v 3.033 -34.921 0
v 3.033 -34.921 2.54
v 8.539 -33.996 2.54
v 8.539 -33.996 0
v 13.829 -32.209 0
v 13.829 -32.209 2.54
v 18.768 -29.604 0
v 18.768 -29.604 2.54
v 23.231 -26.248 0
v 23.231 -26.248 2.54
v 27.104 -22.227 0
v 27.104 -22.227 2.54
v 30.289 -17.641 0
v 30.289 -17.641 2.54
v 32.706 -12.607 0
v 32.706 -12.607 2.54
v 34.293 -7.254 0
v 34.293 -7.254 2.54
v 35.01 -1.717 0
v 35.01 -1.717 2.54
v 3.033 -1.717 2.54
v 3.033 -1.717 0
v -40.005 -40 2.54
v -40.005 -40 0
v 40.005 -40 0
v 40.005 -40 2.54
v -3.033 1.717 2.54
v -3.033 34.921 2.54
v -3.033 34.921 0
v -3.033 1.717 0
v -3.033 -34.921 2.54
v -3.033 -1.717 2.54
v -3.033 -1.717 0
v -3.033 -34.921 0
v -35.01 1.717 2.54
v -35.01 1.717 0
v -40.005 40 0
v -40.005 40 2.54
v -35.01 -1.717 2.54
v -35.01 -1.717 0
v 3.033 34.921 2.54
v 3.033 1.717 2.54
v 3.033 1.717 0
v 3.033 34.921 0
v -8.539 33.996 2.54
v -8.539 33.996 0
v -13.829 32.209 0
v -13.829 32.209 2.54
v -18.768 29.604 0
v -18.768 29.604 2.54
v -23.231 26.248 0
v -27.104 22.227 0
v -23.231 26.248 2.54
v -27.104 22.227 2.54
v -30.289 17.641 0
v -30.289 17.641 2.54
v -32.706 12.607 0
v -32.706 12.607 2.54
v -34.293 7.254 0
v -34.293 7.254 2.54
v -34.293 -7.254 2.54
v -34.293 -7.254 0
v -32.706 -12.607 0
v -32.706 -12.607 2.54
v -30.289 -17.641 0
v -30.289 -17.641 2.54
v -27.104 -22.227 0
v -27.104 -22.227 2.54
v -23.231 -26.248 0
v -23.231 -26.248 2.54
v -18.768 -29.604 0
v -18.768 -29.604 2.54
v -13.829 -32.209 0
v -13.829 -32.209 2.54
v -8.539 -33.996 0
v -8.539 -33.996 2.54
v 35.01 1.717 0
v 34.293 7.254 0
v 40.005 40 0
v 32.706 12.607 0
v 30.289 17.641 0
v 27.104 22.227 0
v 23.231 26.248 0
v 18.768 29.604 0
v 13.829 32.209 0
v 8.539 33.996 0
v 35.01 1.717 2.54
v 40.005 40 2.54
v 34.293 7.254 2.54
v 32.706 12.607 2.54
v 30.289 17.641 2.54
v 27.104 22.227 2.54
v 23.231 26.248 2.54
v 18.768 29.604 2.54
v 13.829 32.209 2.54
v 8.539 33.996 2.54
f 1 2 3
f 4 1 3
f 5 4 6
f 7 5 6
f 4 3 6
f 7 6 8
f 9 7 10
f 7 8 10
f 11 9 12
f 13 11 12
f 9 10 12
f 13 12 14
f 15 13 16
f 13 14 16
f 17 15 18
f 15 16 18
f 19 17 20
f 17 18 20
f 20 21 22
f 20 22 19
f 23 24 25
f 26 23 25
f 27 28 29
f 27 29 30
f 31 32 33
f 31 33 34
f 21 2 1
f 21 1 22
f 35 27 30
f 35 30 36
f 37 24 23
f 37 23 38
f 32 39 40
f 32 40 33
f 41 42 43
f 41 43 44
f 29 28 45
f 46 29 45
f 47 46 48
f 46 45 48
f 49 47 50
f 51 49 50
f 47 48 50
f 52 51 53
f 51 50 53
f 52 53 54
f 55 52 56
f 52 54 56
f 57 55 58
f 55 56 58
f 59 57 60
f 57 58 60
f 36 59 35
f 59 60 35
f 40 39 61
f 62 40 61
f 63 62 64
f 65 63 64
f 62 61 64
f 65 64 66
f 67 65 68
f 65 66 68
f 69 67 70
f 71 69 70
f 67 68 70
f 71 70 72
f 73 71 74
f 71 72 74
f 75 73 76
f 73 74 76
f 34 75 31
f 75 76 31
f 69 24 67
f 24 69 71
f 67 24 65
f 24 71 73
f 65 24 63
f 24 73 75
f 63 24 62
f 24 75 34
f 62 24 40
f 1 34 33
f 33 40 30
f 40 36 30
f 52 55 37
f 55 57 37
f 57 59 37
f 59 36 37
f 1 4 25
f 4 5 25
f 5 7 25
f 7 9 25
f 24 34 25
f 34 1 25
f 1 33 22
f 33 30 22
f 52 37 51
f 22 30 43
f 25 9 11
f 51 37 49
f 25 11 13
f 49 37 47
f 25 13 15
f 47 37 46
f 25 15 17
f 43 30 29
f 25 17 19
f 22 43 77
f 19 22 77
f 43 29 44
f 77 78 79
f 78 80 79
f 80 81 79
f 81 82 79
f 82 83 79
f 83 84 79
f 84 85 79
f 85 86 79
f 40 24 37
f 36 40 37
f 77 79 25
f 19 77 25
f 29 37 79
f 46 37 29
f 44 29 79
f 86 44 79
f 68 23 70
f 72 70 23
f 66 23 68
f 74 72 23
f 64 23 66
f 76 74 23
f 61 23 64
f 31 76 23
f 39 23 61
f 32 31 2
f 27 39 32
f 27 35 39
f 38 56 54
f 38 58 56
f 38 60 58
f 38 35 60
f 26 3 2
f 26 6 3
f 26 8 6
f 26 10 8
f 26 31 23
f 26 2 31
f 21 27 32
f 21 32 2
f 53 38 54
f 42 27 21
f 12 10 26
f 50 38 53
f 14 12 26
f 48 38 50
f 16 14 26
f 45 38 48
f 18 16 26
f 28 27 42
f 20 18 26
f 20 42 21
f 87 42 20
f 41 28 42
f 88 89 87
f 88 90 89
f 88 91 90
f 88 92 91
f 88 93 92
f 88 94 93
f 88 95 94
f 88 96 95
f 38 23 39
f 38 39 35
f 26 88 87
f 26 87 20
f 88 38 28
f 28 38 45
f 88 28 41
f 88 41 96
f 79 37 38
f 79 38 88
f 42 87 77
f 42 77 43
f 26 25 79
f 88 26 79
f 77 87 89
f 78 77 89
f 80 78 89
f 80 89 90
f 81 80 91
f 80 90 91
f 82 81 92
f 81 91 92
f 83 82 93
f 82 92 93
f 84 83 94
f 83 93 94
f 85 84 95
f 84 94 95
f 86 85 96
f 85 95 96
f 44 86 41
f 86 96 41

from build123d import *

# Parameters (mm, degrees)
SKETCH1_W           = 80.01
SKETCH1_H           = 80.001
BOSS_EXTRUDE1_DEPTH = 5.08
SKETCH2_R           = 35.052
CUT_EXTRUDE1_DEPTH  = 5.08
SKETCH3_W           = 3.032686736
SKETCH3_H           = 3.433230268
BOSS_EXTRUDE3_DEPTH = 5.08
SKETCH5_W           = 135.597082566
SKETCH5_H           = 106.556051774
CUT_EXTRUDE2_DEPTH  = 2.54


with BuildPart() as part:
    # Sketch1 → Boss-Extrude1 (new body)
    with BuildSketch(Plane.XY):
        Rectangle(SKETCH1_W, SKETCH1_H)
    extrude(amount=BOSS_EXTRUDE1_DEPTH)

    # Sketch2 → Cut-Extrude1 (cut)
    with BuildSketch(Plane.XY.offset(5.08)):
        Circle(SKETCH2_R)
    extrude(amount=-CUT_EXTRUDE1_DEPTH, mode=Mode.SUBTRACT)

    # Sketch3 → Boss-Extrude3 (add)
    with BuildSketch(Plane.XY.offset(5.08)):
        with BuildLine():
            ThreePointArc((3.032686736, 34.920560064), (1.517766887, 35.019124599), (0, 35.052))
            Line((0, 35.052), (0, 1.716615134))
            Line((0, 1.716615134), (3.032686736, 1.716615134))
            Line((3.032686736, 1.716615134), (3.032686736, 34.920560064))
        make_face()
        with BuildLine():
            Line((0, 1.716615134), (0, 35.052))
            ThreePointArc((0, 35.052), (-1.517766887, 35.019124599), (-3.032686736, 34.920560064))
            Line((-3.032686736, 34.920560064), (-3.032686736, 1.716615134))
            Line((-3.032686736, 1.716615134), (0, 1.716615134))
        make_face()
        with BuildLine():
            Line((-3.032686736, -1.716615134), (-3.032686736, 1.716615134))
            Line((-3.032686736, 1.716615134), (-35.009940538, 1.716615134))
            ThreePointArc((-35.009940538, 1.716615134), (-35.052, 0), (-35.009940538, -1.716615134))
            Line((-35.009940538, -1.716615134), (-3.032686736, -1.716615134))
        make_face()
        with Locations((1.516343368, 0)):
            Rectangle(SKETCH3_W, SKETCH3_H)
        with Locations((-1.516343368, 0)):
            Rectangle(SKETCH3_W, SKETCH3_H)
        with BuildLine():
            Line((3.032686736, -1.716615134), (0, -1.716615134))
            Line((0, -1.716615134), (0, -35.052))
            ThreePointArc((0, -35.052), (1.517766887, -35.019124599), (3.032686736, -34.920560064))
            Line((3.032686736, -34.920560064), (3.032686736, -1.716615134))
        make_face()
        with BuildLine():
            Line((0, -35.052), (0, -1.716615134))
            Line((0, -1.716615134), (-3.032686736, -1.716615134))
            Line((-3.032686736, -1.716615134), (-3.032686736, -34.920560064))
            ThreePointArc((-3.032686736, -34.920560064), (-1.517766887, -35.019124599), (0, -35.052))
        make_face()
        with BuildLine():
            Line((35.009940538, 1.716615134), (3.032686736, 1.716615134))
            Line((3.032686736, 1.716615134), (3.032686736, -1.716615134))
            Line((3.032686736, -1.716615134), (35.009940538, -1.716615134))
            ThreePointArc((35.009940538, -1.716615134), (35.041483557, -0.858565157), (35.052, 0))
            ThreePointArc((35.052, 0), (35.041483557, 0.858565157), (35.009940538, 1.716615134))
        make_face()
    extrude(amount=-BOSS_EXTRUDE3_DEPTH)

    # Sketch5 → Cut-Extrude2 (cut)
    with BuildSketch(Plane.XY.offset(5.08)):
        with Locations((8.610263187, -0.677600572)):
            Rectangle(SKETCH5_W, SKETCH5_H)
    extrude(amount=-CUT_EXTRUDE2_DEPTH, mode=Mode.SUBTRACT)


solid = part.part
